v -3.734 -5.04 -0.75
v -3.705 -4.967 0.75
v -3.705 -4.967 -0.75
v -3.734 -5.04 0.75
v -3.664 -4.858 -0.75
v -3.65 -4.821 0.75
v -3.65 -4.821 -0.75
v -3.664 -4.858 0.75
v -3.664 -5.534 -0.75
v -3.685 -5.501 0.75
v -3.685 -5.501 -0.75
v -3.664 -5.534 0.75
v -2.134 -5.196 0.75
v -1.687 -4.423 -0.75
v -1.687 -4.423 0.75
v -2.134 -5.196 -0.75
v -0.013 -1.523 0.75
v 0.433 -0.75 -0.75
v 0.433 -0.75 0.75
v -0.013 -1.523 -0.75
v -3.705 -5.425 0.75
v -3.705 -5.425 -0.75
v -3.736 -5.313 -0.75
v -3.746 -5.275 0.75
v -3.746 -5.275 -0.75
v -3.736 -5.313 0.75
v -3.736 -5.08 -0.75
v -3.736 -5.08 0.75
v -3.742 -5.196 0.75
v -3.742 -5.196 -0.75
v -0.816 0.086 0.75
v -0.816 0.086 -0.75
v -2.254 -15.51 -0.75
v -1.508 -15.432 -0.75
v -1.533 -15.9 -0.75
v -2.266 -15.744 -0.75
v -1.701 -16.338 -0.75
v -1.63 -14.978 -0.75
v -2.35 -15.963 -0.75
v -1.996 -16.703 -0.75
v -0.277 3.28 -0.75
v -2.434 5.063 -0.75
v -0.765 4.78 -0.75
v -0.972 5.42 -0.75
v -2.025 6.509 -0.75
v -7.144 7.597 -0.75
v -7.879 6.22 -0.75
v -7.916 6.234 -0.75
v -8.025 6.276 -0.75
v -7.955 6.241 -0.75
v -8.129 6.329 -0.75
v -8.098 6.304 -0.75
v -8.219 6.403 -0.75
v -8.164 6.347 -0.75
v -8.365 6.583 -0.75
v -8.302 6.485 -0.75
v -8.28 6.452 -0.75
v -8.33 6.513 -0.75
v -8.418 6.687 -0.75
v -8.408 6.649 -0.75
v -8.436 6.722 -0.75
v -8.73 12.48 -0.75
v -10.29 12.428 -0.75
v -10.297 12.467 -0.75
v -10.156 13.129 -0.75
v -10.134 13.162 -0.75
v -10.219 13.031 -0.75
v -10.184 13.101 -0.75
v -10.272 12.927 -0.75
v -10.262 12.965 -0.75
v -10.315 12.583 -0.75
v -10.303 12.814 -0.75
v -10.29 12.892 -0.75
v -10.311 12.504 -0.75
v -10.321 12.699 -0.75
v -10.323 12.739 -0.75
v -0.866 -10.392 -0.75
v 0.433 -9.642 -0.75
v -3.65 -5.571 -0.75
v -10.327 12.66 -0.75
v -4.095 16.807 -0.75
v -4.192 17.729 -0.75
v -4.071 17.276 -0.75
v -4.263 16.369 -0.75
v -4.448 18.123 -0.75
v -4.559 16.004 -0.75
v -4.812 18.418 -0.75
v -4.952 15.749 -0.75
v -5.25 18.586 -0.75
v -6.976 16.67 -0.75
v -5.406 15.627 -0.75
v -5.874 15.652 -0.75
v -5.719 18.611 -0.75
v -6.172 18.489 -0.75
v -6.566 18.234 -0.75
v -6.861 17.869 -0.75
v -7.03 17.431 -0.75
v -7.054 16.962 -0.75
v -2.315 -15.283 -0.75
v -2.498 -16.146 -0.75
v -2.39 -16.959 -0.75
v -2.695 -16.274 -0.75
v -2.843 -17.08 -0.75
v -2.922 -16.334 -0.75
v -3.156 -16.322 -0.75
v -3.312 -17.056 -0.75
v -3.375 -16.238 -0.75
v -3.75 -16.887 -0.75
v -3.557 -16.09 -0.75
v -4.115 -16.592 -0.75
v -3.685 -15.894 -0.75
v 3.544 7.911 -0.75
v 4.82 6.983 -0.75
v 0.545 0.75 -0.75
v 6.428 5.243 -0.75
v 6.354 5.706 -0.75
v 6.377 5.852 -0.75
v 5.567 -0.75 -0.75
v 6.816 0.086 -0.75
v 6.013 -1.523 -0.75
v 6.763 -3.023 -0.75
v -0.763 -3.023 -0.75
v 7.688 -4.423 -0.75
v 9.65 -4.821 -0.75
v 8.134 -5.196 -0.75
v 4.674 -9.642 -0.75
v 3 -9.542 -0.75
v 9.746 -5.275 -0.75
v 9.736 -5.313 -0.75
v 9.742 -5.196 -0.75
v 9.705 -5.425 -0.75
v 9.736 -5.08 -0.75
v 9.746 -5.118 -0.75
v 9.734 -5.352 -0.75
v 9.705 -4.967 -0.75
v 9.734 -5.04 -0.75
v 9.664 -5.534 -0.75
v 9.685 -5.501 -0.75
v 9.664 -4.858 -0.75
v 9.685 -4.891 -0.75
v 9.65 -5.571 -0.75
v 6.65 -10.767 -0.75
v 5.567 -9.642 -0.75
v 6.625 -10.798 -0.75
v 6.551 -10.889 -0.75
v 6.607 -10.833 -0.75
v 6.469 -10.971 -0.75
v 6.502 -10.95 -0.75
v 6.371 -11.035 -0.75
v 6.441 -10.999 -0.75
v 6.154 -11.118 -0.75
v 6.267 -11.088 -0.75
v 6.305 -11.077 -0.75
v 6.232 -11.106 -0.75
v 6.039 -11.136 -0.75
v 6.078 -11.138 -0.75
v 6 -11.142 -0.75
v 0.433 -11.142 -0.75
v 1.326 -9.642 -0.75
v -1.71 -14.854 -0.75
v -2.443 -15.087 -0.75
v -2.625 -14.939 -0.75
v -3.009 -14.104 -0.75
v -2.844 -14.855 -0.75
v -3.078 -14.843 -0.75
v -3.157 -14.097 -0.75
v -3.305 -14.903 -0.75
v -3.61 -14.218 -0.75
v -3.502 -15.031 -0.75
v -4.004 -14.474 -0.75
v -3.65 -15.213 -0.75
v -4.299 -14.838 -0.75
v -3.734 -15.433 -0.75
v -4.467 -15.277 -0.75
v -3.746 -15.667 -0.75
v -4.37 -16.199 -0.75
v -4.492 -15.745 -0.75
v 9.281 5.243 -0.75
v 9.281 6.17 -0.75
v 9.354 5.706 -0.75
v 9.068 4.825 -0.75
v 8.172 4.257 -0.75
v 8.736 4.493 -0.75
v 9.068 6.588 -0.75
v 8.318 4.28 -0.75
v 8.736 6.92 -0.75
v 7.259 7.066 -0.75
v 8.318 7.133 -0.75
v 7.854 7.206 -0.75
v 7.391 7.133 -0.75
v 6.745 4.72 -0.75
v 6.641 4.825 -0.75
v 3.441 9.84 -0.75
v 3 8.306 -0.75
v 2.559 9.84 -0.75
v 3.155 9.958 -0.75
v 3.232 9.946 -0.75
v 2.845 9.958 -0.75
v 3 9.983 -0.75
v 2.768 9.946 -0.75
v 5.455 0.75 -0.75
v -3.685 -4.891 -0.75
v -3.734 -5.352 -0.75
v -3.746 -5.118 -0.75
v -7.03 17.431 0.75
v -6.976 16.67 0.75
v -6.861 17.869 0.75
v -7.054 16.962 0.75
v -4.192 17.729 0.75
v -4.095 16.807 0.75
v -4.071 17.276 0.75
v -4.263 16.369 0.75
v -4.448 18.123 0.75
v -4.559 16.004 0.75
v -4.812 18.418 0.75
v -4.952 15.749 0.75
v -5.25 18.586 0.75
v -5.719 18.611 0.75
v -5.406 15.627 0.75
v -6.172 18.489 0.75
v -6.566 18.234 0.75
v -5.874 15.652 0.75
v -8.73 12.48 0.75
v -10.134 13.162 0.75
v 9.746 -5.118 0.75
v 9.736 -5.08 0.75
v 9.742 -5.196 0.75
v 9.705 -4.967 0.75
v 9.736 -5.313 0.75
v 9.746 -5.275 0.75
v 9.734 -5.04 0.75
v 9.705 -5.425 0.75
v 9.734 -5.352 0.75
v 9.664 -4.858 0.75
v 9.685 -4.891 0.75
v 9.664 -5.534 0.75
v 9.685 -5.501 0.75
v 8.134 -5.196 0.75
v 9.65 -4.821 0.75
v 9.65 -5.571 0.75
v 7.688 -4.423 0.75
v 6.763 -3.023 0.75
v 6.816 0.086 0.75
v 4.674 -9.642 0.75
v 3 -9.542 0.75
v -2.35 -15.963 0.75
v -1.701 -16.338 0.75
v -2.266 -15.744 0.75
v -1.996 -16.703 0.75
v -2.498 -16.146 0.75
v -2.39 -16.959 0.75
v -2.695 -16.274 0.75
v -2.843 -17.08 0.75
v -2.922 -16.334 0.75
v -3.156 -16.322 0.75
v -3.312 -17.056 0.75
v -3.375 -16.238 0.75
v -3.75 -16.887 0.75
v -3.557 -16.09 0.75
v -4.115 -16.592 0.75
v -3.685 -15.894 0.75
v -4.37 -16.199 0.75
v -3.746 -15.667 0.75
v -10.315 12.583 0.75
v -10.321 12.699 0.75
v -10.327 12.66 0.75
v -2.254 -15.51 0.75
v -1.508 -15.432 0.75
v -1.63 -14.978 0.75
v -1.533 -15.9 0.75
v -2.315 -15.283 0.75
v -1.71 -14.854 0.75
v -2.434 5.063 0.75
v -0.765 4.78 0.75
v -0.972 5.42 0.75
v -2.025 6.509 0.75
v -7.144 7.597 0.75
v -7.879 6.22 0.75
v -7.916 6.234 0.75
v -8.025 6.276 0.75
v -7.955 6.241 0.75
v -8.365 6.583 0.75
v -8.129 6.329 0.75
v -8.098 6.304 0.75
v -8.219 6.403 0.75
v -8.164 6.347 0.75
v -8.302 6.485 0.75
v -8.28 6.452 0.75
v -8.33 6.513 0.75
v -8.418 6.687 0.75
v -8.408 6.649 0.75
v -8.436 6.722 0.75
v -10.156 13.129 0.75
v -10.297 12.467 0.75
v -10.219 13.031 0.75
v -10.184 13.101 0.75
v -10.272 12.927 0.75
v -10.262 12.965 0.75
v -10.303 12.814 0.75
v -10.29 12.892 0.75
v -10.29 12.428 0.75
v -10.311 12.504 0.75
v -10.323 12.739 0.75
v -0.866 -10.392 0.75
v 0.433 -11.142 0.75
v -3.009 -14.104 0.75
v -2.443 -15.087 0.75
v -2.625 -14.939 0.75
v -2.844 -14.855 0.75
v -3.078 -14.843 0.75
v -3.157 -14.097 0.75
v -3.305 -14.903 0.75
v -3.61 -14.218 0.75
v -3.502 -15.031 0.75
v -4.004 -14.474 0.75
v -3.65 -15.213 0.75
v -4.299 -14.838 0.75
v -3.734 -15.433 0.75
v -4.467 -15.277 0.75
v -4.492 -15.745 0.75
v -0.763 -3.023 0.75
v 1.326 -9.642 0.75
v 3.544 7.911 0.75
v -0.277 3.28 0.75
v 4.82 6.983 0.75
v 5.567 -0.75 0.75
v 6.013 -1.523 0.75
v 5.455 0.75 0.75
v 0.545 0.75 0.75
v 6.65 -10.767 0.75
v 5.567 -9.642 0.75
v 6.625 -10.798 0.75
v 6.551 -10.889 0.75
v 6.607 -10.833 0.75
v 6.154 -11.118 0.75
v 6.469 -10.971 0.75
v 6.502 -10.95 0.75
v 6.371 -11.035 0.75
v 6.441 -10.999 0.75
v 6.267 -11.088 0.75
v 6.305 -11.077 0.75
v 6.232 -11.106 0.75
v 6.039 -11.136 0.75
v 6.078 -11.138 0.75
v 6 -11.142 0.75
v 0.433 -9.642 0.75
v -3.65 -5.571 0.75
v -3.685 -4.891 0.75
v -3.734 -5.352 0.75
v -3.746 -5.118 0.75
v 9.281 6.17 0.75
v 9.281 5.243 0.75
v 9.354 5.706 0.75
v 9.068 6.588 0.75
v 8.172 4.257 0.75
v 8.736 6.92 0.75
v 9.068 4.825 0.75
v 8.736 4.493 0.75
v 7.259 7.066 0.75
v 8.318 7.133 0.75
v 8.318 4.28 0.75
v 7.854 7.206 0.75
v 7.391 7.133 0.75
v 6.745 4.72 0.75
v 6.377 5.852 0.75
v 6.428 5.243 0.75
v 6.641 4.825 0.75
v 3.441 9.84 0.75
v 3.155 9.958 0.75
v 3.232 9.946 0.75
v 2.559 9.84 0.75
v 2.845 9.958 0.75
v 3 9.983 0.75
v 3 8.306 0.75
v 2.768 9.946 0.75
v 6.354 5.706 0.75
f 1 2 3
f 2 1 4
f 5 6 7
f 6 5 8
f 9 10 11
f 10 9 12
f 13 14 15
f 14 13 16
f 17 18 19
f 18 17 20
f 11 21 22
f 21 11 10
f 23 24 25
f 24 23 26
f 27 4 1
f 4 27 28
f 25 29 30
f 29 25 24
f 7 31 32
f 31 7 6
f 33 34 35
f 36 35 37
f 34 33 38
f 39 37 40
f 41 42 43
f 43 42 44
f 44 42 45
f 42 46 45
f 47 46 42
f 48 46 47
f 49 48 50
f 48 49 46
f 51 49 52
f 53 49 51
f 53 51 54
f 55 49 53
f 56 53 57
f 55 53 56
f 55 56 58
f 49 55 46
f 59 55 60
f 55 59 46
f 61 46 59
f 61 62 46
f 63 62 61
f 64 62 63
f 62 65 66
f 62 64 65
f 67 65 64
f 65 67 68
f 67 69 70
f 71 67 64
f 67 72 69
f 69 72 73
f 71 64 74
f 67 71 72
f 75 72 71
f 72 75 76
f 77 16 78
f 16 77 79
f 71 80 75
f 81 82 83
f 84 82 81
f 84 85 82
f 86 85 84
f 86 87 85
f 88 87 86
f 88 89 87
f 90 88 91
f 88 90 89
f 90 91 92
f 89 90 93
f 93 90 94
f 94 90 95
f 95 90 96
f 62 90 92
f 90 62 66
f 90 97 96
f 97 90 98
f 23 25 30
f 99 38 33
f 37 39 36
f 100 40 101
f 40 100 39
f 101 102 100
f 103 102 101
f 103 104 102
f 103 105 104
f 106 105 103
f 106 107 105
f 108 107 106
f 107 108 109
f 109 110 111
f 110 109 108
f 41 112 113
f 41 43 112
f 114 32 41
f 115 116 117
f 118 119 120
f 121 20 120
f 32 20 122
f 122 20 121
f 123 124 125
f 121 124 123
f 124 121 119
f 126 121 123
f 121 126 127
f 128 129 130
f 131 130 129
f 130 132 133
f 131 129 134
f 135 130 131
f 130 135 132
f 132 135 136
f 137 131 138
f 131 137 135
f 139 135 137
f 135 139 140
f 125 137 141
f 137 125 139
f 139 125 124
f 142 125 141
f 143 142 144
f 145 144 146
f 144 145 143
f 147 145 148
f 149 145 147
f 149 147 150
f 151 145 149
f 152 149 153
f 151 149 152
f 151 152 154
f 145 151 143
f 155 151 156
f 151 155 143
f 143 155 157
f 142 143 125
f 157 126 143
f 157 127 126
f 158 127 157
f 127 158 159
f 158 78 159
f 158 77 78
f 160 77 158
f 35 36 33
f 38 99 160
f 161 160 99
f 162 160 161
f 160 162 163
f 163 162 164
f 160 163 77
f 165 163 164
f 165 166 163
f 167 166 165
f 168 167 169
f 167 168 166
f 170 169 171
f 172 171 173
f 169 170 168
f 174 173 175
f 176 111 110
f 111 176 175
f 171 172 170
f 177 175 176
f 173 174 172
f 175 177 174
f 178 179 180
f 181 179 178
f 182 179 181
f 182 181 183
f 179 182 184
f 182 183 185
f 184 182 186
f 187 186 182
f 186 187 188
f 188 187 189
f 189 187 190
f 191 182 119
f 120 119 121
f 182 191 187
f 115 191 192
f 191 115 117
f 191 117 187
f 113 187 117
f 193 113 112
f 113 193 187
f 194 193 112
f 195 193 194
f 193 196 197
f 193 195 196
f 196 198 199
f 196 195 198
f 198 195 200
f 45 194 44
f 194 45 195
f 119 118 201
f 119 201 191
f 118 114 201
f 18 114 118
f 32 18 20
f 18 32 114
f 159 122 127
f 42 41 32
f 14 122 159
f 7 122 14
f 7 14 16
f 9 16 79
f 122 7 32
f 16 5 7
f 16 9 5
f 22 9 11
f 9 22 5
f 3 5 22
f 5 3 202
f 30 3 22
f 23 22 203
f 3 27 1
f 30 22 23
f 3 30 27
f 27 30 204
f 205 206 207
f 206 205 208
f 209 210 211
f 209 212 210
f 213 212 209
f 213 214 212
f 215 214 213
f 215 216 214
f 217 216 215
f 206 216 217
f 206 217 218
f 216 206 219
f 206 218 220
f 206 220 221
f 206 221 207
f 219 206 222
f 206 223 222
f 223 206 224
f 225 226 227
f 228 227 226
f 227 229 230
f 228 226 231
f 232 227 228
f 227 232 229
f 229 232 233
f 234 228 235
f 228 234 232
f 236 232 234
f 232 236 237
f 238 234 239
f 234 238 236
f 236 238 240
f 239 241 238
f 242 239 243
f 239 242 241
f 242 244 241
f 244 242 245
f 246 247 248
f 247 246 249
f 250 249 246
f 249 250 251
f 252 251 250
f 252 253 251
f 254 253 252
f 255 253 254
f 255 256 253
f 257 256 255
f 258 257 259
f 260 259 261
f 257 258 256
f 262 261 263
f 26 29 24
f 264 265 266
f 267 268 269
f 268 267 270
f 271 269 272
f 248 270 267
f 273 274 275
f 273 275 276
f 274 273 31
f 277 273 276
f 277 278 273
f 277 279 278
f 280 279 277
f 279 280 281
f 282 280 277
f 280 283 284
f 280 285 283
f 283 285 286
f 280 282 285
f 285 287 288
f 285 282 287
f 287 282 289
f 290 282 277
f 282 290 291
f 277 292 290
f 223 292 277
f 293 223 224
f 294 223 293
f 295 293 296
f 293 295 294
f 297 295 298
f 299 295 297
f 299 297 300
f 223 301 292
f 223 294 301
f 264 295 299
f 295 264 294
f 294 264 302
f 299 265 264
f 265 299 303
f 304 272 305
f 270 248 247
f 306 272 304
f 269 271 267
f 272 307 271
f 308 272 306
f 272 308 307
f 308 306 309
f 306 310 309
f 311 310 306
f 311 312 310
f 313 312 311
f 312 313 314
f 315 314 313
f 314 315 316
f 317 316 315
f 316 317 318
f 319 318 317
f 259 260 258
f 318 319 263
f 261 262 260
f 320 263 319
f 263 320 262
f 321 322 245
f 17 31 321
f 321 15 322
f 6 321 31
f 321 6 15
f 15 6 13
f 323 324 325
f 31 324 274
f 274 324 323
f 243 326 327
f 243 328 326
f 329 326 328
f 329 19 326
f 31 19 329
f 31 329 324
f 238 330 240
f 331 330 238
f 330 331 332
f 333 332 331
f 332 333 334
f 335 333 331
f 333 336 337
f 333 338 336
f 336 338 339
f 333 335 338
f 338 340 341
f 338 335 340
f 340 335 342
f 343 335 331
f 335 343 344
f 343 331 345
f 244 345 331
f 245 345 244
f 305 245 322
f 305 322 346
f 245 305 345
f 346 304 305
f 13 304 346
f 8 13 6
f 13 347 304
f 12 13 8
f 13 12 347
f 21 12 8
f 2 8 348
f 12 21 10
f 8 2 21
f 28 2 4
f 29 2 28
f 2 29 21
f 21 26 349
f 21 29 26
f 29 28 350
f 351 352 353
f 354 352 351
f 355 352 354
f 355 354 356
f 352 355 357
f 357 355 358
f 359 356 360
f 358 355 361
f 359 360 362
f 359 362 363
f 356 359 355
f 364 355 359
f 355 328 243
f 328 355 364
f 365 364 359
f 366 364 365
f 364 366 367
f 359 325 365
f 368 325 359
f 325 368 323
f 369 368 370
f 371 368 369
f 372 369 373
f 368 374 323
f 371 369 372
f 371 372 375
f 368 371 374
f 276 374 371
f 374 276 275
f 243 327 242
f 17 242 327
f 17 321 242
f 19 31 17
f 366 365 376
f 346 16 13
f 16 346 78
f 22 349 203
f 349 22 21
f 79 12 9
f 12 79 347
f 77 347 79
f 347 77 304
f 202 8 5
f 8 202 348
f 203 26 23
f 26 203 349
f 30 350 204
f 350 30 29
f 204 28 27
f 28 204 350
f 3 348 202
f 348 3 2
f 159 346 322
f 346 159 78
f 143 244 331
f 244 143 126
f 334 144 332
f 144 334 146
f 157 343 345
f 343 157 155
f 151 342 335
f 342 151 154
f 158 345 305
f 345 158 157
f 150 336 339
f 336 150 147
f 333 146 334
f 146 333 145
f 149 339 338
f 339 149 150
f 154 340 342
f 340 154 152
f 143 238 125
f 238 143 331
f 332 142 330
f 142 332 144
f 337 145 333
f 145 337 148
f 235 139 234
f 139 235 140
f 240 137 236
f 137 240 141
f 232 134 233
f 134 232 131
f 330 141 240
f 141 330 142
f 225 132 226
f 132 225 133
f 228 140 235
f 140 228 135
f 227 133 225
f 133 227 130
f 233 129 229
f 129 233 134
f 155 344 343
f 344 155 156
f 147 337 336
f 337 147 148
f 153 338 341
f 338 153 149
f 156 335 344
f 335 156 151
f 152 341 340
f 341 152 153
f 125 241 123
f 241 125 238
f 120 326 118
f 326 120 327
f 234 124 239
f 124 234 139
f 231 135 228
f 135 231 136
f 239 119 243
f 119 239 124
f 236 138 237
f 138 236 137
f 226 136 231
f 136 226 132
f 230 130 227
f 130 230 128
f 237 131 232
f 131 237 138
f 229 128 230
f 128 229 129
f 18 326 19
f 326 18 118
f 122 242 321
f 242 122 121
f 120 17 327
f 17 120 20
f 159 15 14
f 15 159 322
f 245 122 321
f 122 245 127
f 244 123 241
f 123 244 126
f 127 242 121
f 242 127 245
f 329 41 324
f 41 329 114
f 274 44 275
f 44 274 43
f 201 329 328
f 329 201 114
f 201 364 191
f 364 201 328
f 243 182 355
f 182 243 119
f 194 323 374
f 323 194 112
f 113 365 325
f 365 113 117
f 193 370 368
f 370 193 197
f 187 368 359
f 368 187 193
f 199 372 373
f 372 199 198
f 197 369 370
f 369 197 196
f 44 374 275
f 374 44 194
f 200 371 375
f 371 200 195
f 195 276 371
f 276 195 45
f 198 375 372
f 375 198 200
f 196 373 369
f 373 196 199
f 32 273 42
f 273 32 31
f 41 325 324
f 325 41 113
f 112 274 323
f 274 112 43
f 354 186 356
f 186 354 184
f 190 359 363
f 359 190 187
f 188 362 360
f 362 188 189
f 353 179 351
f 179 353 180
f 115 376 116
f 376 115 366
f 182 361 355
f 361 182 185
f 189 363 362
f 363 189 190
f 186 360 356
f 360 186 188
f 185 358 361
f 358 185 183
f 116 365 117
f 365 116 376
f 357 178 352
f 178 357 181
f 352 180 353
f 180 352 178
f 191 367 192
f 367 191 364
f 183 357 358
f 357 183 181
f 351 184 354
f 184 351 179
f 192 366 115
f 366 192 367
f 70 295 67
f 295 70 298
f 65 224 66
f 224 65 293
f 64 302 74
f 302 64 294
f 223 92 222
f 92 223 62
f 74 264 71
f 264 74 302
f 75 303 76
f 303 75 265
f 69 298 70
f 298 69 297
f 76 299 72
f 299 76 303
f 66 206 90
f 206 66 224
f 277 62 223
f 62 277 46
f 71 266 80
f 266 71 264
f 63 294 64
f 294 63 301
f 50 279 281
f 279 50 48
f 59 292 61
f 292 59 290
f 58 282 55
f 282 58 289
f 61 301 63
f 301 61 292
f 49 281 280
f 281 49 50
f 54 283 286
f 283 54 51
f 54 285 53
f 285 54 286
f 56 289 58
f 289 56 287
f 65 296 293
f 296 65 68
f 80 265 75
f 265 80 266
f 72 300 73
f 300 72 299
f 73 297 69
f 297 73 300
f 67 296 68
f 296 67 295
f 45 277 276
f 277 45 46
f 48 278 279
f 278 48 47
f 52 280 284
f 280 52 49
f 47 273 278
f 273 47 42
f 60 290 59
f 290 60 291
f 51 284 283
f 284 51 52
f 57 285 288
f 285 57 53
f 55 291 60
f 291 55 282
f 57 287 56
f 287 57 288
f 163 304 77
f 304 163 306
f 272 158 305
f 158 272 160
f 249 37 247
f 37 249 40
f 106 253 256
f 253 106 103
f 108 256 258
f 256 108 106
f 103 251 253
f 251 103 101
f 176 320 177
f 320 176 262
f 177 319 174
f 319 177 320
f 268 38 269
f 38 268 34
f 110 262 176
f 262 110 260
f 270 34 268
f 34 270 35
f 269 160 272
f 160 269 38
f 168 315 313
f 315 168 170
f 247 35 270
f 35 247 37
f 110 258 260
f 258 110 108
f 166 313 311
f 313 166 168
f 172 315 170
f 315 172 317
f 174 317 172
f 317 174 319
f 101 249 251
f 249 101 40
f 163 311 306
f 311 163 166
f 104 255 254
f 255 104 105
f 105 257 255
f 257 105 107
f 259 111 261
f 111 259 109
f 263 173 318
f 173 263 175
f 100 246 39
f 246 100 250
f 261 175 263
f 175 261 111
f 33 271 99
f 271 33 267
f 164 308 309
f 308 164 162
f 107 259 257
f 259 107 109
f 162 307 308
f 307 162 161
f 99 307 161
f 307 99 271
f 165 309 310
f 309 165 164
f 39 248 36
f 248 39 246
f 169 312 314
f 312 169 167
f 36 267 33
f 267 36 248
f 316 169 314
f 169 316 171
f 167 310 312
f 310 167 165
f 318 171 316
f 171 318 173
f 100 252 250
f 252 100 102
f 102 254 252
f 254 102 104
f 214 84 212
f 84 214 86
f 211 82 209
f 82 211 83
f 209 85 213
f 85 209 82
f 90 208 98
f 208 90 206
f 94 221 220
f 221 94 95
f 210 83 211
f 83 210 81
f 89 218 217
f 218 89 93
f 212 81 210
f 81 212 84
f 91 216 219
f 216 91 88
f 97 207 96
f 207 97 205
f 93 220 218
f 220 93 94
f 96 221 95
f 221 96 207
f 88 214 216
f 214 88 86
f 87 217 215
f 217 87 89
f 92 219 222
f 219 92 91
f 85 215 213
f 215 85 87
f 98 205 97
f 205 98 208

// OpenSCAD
$fn=20;

module bond(a=1, length=10){
    hull(){
        cylinder(d=a,h=a,center=true);
        translate([length,0,0]) cylinder(d=a,h=a,center=true);
    }
}

module cyclohexan(a=1,length=10){
    _recursiveBond(a,length,0,6,-60);
}

module _recursiveBond(a,length,counter,iterations,angle){
    if(counter < iterations){
        translate([length,0,0]) rotate([0,0,angle]) _recursiveBond(a,length,counter+1,iterations,angle);
        bond(a,length);
    }
}

module benzen(a=1,length=10){
    cyclohexan(a,length);
    translate([length,0,0]) rotate([0,0,-60]) _recursiveBondEven(a,length,0,3,-60);
}

module _recursiveBondEven(a,length,counter,iterations,angle,const=1.75){
    
    if(counter < iterations){
        translate([length,0,0]) rotate([0,0,angle]) translate([length,0,0]) rotate([0,0,angle]) _recursiveBondEven(a,length,counter+1,iterations,angle);
    }
    translate([length-const*a,0,0]) rotate([0,0,angle]) bond(a,length+const*a);   
}

module cycloPentan(a=1,length=10){
    _recursiveBond(a,length,0,6,-72);
}

module pyrol(a=1,length=10){
    //cycloPentan
    _recursiveBond(a,length,0,6,-72);
    //doubleBond
    translate([length-1.5*a,0,0]) rotate([0,0,-72])bond(a,length+0.75*a);
    //nitrogen
    rotate([0,0,-108]) translate([length,0,0]) rotate([0,0,72]) translate([length,0,0]) cylinder(r=a,h=a,center=true);
    }

module indol(a=1,length=10){
    benzen(a,length);
    rotate([0,0,108]) pyrol(a,length);
}

module nChain(a=1,length=10,carbons){
    _recursiveBond(a,length,0,carbons,-60);
    }

module serotonin(a=1,length=10){
    indol(a,length);
    //nitrogen chain
    // chain
    rotate([0,0,108]) translate([length,0,0]) rotate([0,0,60]) nChain(a,length,3);
    // nitrogen
    rotate([0,0,108]) translate([length,0,0]) rotate([0,0,60]) translate([length,0,0]) rotate([0,0,-60]) translate([length,0,0]) rotate([0,0,-60]) translate([length,0,0]) rotate([0,0,-60])     cylinder(r=a,h=a,center=true);
    // hydroxy
    rotate([0,0,-120]) translate([length,0,0]) rotate([0,0,60]) translate([length,0,0]) rotate([0,0,-60])
        {
        difference(){
            union(){
                bond(a,length);
                translate([length,0,0]) cylinder(r=a,h=a,center=true);
            }
                translate([length,0,0]) cylinder(r=0.5*a,h=2*a,center=true);
            }
        }
    }

//translate([20,0,0])
//pyrol();
serotonin(a=1.5,length=6);
